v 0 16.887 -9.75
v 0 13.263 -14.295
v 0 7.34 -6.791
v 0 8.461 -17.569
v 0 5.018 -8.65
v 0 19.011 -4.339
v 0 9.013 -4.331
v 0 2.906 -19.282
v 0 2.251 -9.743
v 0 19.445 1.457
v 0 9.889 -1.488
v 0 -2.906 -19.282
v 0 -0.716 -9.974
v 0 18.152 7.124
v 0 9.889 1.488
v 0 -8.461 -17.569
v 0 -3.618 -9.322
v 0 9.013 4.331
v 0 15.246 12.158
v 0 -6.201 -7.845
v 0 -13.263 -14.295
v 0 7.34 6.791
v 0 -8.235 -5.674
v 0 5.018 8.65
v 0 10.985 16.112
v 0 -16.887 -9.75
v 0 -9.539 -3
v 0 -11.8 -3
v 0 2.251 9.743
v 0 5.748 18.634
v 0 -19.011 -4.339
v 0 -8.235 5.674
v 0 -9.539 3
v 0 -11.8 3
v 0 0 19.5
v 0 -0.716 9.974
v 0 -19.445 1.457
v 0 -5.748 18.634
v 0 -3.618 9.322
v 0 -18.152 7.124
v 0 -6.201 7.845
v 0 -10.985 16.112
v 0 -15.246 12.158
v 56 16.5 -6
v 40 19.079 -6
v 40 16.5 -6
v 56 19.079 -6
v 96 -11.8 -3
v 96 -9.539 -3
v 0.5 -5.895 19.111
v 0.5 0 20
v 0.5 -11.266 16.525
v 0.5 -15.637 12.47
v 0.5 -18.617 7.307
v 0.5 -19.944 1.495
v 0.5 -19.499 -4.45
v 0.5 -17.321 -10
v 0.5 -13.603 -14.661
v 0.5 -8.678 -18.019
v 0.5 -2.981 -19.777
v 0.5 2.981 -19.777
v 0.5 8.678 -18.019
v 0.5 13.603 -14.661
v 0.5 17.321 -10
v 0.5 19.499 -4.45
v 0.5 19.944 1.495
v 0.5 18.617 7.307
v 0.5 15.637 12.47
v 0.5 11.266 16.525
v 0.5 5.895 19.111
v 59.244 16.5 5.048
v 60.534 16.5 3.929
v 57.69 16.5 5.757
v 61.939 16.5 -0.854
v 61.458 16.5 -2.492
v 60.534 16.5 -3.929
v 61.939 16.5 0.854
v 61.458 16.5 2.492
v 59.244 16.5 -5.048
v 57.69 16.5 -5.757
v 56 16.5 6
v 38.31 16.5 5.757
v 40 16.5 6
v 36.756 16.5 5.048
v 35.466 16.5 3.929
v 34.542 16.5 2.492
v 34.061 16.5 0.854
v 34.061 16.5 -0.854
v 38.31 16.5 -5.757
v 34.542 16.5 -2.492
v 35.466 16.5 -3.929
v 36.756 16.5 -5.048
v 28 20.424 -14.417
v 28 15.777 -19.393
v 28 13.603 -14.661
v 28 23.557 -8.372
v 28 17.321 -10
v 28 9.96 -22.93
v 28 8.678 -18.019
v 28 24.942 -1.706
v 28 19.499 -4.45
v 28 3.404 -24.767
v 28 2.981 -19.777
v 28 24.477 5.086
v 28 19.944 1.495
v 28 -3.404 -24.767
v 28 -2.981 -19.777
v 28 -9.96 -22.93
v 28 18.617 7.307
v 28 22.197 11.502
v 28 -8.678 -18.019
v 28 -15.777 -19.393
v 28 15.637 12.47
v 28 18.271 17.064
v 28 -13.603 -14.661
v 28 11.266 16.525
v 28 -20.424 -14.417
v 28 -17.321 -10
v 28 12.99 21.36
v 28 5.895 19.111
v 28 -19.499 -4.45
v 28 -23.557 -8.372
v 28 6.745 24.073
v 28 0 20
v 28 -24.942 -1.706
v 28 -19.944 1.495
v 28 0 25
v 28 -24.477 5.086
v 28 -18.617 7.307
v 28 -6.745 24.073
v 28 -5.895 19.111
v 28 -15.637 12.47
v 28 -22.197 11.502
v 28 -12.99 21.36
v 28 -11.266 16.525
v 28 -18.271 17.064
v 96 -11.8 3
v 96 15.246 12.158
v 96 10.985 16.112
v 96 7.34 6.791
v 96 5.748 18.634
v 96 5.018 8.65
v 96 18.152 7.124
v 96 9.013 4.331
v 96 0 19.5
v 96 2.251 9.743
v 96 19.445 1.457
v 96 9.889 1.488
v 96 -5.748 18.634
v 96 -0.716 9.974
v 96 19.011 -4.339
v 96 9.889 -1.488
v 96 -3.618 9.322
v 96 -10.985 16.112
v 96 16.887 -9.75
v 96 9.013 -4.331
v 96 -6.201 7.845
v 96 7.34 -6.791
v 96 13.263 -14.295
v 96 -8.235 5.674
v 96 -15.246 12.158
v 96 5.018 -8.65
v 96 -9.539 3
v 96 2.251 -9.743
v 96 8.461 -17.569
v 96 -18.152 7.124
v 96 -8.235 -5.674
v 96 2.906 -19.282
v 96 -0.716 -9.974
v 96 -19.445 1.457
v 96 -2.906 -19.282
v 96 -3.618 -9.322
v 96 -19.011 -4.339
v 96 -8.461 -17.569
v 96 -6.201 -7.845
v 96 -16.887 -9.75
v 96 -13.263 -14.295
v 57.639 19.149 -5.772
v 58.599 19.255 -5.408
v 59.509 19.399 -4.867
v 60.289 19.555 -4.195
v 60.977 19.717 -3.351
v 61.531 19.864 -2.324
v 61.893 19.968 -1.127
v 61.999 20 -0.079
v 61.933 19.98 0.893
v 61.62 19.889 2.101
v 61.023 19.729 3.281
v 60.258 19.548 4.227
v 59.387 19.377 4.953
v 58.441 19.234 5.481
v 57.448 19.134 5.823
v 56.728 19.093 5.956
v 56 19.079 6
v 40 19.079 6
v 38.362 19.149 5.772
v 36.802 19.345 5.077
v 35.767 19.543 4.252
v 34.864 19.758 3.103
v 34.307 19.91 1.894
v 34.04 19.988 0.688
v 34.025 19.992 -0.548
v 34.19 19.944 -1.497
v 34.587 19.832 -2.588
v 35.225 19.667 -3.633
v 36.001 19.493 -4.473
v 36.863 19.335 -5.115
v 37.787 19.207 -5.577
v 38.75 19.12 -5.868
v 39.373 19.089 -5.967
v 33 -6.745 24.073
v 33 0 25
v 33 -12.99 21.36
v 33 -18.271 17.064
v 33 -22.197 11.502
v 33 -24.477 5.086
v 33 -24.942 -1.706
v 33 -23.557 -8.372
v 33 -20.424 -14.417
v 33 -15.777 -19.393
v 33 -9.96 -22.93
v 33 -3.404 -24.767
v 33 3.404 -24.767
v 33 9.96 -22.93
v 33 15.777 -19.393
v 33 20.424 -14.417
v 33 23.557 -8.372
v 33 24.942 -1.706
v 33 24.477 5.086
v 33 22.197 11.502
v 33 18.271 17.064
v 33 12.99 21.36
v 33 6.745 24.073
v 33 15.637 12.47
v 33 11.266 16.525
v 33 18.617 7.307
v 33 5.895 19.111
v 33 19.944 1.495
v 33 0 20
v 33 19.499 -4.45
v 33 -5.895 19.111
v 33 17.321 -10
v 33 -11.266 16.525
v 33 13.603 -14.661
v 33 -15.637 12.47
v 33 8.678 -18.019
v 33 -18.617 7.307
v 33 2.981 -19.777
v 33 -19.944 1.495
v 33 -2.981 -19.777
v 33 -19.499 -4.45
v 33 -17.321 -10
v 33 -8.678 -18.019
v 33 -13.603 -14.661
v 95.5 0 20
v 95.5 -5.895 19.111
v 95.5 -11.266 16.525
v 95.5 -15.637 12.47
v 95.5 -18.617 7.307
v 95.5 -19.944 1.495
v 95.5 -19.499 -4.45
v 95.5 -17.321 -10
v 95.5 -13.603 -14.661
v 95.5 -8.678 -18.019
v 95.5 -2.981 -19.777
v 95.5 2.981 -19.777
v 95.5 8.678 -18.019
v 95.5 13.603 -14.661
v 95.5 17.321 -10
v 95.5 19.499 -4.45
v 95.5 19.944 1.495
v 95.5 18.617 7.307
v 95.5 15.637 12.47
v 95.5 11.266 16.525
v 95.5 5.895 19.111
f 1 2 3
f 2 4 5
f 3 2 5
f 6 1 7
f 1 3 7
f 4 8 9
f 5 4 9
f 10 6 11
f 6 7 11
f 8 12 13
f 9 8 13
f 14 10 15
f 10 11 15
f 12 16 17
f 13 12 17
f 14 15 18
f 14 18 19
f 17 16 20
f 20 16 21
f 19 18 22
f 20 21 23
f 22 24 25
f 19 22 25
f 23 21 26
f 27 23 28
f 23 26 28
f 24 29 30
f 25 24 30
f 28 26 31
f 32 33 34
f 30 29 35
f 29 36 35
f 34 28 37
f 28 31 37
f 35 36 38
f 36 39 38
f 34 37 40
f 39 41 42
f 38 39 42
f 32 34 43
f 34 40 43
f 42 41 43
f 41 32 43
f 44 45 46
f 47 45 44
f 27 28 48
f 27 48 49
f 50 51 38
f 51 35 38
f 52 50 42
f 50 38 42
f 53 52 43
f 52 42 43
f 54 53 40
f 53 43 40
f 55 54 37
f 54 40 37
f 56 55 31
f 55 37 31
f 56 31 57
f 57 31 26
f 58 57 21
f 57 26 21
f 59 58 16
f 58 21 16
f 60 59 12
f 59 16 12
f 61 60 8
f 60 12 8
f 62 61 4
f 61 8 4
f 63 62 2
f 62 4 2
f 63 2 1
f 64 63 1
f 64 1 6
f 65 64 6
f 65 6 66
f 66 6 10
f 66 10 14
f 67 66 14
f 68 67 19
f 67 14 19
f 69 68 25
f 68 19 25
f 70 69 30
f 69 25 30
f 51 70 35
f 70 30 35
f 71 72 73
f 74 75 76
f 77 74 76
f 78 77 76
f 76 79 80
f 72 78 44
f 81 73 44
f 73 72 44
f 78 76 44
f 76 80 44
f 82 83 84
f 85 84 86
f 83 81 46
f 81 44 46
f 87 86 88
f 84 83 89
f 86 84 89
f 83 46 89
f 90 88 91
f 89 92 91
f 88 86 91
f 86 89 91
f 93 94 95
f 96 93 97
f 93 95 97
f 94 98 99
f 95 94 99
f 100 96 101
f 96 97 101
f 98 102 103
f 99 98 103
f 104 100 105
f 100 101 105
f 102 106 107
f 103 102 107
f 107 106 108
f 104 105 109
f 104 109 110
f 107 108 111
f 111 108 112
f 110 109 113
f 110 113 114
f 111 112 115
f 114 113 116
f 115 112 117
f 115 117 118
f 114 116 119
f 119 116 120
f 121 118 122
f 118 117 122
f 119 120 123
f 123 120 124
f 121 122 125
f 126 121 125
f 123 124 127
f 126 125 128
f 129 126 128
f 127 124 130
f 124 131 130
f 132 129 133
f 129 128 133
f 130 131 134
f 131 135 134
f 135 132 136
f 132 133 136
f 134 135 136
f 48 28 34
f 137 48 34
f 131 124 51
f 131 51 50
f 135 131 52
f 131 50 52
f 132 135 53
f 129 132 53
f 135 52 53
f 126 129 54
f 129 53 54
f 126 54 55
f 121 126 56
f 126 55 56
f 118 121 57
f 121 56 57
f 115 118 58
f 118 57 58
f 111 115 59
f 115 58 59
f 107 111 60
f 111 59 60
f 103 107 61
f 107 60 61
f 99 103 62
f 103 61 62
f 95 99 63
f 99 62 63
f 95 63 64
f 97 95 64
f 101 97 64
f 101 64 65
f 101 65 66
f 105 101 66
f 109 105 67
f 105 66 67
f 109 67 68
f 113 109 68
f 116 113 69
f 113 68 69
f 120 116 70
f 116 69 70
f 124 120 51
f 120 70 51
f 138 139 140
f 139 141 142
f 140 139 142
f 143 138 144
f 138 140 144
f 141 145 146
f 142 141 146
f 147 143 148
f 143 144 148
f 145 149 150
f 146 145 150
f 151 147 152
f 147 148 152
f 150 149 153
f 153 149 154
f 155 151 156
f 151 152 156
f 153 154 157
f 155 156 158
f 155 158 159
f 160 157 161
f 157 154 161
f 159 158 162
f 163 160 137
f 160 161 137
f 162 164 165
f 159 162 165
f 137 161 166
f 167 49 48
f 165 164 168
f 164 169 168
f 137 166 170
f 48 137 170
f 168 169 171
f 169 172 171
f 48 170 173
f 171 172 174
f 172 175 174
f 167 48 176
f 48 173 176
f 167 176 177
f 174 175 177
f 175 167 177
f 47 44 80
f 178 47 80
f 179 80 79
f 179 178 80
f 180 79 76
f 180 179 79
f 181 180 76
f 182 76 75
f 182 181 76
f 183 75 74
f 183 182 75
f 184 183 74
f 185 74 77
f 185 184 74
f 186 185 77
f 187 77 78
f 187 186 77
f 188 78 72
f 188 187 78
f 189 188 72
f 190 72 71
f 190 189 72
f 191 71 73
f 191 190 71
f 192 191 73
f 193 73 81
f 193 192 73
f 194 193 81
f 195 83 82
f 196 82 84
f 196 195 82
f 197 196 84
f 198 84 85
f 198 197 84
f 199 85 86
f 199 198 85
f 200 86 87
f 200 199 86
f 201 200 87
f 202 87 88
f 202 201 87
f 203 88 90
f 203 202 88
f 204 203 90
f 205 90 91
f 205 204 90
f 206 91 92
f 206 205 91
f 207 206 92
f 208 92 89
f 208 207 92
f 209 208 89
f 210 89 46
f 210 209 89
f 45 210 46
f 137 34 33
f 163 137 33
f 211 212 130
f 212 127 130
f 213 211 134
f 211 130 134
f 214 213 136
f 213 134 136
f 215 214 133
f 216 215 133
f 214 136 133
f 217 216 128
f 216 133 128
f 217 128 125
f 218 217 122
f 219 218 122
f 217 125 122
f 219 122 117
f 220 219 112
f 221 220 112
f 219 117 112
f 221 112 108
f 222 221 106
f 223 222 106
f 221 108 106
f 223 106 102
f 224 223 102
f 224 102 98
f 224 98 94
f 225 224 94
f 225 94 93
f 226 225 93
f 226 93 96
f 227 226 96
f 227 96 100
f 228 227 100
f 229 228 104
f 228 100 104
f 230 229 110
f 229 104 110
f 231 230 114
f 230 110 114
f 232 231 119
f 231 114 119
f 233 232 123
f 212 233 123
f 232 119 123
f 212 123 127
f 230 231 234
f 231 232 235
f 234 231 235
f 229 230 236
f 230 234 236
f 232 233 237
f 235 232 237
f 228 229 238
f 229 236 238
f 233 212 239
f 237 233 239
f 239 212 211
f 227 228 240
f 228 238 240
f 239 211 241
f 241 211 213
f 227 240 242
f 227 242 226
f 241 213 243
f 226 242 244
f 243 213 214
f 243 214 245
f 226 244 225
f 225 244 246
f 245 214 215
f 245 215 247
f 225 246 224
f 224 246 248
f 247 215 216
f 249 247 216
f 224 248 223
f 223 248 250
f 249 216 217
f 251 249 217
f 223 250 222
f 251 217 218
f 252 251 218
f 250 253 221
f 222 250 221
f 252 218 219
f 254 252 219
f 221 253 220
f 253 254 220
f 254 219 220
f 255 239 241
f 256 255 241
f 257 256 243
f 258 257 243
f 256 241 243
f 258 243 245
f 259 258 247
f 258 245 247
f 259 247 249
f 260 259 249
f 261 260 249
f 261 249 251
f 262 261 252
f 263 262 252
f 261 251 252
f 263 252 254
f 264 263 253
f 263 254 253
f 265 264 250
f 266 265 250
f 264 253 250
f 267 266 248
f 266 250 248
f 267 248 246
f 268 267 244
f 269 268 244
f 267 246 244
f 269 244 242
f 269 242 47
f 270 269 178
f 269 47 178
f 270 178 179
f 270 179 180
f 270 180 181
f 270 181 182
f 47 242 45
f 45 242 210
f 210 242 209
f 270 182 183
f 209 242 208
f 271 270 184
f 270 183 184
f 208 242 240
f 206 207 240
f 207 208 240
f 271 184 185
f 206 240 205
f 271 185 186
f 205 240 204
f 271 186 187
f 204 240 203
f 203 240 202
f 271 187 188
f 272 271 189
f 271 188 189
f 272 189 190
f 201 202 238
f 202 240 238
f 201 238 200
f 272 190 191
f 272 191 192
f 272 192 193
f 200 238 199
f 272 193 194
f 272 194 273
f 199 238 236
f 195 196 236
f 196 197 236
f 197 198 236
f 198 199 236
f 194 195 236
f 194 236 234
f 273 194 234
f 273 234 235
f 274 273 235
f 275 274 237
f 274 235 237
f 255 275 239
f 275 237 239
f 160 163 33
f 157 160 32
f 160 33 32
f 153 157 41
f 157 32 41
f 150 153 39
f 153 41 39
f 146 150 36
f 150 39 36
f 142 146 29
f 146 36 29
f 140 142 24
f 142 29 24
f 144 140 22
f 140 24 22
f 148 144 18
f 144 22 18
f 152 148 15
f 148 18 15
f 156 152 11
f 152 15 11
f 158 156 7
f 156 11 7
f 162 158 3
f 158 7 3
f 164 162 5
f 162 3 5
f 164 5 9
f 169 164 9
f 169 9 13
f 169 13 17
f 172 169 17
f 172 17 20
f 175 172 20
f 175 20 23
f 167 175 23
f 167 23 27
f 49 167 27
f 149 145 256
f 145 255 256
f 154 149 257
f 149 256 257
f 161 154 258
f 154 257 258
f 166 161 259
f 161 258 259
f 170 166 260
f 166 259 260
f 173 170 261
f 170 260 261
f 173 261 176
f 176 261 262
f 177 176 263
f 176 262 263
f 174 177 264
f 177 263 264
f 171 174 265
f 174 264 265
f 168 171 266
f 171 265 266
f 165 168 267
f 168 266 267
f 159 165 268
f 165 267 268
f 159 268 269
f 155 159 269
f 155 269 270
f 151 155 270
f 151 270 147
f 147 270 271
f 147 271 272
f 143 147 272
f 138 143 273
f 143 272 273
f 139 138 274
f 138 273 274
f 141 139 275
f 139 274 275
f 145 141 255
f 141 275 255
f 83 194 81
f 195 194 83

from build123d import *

# Parameters (mm, degrees)
CUT_EXTRUDE1_DEPTH = 3.5
SKETCH3_R          = 10
CUT_EXTRUDE2_DEPTH = 103.303470127
SKETCH4_W          = 6
SKETCH4_H          = 3.081008582
CUT_EXTRUDE3_DEPTH = 103.303470127


with BuildPart() as part:
    # Sketch1 → Revolve1 (revolve)
    with BuildSketch(Plane(origin=(0, 0, 0), x_dir=(1, 0, 0), z_dir=(0, 1, 0)), mode=Mode.PRIVATE) as revolve1_sk:
        Polygon((96, 0), (96, 19.5), (95.5, 20), (33, 20), (33, 25), (28, 25), (28, 20), (0.5, 20), (0, 19.5), (0, 0), align=None)
    revolve(revolve1_sk.sketch.rotate(Axis((0, 0, 0), (1, 0, 0)), 180), axis=Axis((0, 0, 0), (1, 0, 0)))

    # Sketch2 → Cut-Extrude1 (cut)
    with BuildSketch(Plane(origin=(0, 20, 0), x_dir=(1, 0, 0), z_dir=(0, 1, 0))):
        with BuildLine():
            Line((40, 6), (56, 6))
            ThreePointArc((56, 6), (62, 0), (56, -6))
            Line((56, -6), (40, -6))
            ThreePointArc((40, -6), (34, 0), (40, 6))
        make_face()
    extrude(amount=-CUT_EXTRUDE1_DEPTH, mode=Mode.SUBTRACT)

    # Sketch3 → Cut-Extrude2 (cut, through all)
    with BuildSketch(Plane.ZY):
        Circle(SKETCH3_R)
    extrude(amount=-CUT_EXTRUDE2_DEPTH, mode=Mode.SUBTRACT)

    # Sketch4 → Cut-Extrude3 (cut, through all)
    with BuildSketch(Plane.ZY):
        with Locations((0, -10.259495709)):
            Rectangle(SKETCH4_W, SKETCH4_H)
    extrude(amount=-CUT_EXTRUDE3_DEPTH, mode=Mode.SUBTRACT)


solid = part.part
